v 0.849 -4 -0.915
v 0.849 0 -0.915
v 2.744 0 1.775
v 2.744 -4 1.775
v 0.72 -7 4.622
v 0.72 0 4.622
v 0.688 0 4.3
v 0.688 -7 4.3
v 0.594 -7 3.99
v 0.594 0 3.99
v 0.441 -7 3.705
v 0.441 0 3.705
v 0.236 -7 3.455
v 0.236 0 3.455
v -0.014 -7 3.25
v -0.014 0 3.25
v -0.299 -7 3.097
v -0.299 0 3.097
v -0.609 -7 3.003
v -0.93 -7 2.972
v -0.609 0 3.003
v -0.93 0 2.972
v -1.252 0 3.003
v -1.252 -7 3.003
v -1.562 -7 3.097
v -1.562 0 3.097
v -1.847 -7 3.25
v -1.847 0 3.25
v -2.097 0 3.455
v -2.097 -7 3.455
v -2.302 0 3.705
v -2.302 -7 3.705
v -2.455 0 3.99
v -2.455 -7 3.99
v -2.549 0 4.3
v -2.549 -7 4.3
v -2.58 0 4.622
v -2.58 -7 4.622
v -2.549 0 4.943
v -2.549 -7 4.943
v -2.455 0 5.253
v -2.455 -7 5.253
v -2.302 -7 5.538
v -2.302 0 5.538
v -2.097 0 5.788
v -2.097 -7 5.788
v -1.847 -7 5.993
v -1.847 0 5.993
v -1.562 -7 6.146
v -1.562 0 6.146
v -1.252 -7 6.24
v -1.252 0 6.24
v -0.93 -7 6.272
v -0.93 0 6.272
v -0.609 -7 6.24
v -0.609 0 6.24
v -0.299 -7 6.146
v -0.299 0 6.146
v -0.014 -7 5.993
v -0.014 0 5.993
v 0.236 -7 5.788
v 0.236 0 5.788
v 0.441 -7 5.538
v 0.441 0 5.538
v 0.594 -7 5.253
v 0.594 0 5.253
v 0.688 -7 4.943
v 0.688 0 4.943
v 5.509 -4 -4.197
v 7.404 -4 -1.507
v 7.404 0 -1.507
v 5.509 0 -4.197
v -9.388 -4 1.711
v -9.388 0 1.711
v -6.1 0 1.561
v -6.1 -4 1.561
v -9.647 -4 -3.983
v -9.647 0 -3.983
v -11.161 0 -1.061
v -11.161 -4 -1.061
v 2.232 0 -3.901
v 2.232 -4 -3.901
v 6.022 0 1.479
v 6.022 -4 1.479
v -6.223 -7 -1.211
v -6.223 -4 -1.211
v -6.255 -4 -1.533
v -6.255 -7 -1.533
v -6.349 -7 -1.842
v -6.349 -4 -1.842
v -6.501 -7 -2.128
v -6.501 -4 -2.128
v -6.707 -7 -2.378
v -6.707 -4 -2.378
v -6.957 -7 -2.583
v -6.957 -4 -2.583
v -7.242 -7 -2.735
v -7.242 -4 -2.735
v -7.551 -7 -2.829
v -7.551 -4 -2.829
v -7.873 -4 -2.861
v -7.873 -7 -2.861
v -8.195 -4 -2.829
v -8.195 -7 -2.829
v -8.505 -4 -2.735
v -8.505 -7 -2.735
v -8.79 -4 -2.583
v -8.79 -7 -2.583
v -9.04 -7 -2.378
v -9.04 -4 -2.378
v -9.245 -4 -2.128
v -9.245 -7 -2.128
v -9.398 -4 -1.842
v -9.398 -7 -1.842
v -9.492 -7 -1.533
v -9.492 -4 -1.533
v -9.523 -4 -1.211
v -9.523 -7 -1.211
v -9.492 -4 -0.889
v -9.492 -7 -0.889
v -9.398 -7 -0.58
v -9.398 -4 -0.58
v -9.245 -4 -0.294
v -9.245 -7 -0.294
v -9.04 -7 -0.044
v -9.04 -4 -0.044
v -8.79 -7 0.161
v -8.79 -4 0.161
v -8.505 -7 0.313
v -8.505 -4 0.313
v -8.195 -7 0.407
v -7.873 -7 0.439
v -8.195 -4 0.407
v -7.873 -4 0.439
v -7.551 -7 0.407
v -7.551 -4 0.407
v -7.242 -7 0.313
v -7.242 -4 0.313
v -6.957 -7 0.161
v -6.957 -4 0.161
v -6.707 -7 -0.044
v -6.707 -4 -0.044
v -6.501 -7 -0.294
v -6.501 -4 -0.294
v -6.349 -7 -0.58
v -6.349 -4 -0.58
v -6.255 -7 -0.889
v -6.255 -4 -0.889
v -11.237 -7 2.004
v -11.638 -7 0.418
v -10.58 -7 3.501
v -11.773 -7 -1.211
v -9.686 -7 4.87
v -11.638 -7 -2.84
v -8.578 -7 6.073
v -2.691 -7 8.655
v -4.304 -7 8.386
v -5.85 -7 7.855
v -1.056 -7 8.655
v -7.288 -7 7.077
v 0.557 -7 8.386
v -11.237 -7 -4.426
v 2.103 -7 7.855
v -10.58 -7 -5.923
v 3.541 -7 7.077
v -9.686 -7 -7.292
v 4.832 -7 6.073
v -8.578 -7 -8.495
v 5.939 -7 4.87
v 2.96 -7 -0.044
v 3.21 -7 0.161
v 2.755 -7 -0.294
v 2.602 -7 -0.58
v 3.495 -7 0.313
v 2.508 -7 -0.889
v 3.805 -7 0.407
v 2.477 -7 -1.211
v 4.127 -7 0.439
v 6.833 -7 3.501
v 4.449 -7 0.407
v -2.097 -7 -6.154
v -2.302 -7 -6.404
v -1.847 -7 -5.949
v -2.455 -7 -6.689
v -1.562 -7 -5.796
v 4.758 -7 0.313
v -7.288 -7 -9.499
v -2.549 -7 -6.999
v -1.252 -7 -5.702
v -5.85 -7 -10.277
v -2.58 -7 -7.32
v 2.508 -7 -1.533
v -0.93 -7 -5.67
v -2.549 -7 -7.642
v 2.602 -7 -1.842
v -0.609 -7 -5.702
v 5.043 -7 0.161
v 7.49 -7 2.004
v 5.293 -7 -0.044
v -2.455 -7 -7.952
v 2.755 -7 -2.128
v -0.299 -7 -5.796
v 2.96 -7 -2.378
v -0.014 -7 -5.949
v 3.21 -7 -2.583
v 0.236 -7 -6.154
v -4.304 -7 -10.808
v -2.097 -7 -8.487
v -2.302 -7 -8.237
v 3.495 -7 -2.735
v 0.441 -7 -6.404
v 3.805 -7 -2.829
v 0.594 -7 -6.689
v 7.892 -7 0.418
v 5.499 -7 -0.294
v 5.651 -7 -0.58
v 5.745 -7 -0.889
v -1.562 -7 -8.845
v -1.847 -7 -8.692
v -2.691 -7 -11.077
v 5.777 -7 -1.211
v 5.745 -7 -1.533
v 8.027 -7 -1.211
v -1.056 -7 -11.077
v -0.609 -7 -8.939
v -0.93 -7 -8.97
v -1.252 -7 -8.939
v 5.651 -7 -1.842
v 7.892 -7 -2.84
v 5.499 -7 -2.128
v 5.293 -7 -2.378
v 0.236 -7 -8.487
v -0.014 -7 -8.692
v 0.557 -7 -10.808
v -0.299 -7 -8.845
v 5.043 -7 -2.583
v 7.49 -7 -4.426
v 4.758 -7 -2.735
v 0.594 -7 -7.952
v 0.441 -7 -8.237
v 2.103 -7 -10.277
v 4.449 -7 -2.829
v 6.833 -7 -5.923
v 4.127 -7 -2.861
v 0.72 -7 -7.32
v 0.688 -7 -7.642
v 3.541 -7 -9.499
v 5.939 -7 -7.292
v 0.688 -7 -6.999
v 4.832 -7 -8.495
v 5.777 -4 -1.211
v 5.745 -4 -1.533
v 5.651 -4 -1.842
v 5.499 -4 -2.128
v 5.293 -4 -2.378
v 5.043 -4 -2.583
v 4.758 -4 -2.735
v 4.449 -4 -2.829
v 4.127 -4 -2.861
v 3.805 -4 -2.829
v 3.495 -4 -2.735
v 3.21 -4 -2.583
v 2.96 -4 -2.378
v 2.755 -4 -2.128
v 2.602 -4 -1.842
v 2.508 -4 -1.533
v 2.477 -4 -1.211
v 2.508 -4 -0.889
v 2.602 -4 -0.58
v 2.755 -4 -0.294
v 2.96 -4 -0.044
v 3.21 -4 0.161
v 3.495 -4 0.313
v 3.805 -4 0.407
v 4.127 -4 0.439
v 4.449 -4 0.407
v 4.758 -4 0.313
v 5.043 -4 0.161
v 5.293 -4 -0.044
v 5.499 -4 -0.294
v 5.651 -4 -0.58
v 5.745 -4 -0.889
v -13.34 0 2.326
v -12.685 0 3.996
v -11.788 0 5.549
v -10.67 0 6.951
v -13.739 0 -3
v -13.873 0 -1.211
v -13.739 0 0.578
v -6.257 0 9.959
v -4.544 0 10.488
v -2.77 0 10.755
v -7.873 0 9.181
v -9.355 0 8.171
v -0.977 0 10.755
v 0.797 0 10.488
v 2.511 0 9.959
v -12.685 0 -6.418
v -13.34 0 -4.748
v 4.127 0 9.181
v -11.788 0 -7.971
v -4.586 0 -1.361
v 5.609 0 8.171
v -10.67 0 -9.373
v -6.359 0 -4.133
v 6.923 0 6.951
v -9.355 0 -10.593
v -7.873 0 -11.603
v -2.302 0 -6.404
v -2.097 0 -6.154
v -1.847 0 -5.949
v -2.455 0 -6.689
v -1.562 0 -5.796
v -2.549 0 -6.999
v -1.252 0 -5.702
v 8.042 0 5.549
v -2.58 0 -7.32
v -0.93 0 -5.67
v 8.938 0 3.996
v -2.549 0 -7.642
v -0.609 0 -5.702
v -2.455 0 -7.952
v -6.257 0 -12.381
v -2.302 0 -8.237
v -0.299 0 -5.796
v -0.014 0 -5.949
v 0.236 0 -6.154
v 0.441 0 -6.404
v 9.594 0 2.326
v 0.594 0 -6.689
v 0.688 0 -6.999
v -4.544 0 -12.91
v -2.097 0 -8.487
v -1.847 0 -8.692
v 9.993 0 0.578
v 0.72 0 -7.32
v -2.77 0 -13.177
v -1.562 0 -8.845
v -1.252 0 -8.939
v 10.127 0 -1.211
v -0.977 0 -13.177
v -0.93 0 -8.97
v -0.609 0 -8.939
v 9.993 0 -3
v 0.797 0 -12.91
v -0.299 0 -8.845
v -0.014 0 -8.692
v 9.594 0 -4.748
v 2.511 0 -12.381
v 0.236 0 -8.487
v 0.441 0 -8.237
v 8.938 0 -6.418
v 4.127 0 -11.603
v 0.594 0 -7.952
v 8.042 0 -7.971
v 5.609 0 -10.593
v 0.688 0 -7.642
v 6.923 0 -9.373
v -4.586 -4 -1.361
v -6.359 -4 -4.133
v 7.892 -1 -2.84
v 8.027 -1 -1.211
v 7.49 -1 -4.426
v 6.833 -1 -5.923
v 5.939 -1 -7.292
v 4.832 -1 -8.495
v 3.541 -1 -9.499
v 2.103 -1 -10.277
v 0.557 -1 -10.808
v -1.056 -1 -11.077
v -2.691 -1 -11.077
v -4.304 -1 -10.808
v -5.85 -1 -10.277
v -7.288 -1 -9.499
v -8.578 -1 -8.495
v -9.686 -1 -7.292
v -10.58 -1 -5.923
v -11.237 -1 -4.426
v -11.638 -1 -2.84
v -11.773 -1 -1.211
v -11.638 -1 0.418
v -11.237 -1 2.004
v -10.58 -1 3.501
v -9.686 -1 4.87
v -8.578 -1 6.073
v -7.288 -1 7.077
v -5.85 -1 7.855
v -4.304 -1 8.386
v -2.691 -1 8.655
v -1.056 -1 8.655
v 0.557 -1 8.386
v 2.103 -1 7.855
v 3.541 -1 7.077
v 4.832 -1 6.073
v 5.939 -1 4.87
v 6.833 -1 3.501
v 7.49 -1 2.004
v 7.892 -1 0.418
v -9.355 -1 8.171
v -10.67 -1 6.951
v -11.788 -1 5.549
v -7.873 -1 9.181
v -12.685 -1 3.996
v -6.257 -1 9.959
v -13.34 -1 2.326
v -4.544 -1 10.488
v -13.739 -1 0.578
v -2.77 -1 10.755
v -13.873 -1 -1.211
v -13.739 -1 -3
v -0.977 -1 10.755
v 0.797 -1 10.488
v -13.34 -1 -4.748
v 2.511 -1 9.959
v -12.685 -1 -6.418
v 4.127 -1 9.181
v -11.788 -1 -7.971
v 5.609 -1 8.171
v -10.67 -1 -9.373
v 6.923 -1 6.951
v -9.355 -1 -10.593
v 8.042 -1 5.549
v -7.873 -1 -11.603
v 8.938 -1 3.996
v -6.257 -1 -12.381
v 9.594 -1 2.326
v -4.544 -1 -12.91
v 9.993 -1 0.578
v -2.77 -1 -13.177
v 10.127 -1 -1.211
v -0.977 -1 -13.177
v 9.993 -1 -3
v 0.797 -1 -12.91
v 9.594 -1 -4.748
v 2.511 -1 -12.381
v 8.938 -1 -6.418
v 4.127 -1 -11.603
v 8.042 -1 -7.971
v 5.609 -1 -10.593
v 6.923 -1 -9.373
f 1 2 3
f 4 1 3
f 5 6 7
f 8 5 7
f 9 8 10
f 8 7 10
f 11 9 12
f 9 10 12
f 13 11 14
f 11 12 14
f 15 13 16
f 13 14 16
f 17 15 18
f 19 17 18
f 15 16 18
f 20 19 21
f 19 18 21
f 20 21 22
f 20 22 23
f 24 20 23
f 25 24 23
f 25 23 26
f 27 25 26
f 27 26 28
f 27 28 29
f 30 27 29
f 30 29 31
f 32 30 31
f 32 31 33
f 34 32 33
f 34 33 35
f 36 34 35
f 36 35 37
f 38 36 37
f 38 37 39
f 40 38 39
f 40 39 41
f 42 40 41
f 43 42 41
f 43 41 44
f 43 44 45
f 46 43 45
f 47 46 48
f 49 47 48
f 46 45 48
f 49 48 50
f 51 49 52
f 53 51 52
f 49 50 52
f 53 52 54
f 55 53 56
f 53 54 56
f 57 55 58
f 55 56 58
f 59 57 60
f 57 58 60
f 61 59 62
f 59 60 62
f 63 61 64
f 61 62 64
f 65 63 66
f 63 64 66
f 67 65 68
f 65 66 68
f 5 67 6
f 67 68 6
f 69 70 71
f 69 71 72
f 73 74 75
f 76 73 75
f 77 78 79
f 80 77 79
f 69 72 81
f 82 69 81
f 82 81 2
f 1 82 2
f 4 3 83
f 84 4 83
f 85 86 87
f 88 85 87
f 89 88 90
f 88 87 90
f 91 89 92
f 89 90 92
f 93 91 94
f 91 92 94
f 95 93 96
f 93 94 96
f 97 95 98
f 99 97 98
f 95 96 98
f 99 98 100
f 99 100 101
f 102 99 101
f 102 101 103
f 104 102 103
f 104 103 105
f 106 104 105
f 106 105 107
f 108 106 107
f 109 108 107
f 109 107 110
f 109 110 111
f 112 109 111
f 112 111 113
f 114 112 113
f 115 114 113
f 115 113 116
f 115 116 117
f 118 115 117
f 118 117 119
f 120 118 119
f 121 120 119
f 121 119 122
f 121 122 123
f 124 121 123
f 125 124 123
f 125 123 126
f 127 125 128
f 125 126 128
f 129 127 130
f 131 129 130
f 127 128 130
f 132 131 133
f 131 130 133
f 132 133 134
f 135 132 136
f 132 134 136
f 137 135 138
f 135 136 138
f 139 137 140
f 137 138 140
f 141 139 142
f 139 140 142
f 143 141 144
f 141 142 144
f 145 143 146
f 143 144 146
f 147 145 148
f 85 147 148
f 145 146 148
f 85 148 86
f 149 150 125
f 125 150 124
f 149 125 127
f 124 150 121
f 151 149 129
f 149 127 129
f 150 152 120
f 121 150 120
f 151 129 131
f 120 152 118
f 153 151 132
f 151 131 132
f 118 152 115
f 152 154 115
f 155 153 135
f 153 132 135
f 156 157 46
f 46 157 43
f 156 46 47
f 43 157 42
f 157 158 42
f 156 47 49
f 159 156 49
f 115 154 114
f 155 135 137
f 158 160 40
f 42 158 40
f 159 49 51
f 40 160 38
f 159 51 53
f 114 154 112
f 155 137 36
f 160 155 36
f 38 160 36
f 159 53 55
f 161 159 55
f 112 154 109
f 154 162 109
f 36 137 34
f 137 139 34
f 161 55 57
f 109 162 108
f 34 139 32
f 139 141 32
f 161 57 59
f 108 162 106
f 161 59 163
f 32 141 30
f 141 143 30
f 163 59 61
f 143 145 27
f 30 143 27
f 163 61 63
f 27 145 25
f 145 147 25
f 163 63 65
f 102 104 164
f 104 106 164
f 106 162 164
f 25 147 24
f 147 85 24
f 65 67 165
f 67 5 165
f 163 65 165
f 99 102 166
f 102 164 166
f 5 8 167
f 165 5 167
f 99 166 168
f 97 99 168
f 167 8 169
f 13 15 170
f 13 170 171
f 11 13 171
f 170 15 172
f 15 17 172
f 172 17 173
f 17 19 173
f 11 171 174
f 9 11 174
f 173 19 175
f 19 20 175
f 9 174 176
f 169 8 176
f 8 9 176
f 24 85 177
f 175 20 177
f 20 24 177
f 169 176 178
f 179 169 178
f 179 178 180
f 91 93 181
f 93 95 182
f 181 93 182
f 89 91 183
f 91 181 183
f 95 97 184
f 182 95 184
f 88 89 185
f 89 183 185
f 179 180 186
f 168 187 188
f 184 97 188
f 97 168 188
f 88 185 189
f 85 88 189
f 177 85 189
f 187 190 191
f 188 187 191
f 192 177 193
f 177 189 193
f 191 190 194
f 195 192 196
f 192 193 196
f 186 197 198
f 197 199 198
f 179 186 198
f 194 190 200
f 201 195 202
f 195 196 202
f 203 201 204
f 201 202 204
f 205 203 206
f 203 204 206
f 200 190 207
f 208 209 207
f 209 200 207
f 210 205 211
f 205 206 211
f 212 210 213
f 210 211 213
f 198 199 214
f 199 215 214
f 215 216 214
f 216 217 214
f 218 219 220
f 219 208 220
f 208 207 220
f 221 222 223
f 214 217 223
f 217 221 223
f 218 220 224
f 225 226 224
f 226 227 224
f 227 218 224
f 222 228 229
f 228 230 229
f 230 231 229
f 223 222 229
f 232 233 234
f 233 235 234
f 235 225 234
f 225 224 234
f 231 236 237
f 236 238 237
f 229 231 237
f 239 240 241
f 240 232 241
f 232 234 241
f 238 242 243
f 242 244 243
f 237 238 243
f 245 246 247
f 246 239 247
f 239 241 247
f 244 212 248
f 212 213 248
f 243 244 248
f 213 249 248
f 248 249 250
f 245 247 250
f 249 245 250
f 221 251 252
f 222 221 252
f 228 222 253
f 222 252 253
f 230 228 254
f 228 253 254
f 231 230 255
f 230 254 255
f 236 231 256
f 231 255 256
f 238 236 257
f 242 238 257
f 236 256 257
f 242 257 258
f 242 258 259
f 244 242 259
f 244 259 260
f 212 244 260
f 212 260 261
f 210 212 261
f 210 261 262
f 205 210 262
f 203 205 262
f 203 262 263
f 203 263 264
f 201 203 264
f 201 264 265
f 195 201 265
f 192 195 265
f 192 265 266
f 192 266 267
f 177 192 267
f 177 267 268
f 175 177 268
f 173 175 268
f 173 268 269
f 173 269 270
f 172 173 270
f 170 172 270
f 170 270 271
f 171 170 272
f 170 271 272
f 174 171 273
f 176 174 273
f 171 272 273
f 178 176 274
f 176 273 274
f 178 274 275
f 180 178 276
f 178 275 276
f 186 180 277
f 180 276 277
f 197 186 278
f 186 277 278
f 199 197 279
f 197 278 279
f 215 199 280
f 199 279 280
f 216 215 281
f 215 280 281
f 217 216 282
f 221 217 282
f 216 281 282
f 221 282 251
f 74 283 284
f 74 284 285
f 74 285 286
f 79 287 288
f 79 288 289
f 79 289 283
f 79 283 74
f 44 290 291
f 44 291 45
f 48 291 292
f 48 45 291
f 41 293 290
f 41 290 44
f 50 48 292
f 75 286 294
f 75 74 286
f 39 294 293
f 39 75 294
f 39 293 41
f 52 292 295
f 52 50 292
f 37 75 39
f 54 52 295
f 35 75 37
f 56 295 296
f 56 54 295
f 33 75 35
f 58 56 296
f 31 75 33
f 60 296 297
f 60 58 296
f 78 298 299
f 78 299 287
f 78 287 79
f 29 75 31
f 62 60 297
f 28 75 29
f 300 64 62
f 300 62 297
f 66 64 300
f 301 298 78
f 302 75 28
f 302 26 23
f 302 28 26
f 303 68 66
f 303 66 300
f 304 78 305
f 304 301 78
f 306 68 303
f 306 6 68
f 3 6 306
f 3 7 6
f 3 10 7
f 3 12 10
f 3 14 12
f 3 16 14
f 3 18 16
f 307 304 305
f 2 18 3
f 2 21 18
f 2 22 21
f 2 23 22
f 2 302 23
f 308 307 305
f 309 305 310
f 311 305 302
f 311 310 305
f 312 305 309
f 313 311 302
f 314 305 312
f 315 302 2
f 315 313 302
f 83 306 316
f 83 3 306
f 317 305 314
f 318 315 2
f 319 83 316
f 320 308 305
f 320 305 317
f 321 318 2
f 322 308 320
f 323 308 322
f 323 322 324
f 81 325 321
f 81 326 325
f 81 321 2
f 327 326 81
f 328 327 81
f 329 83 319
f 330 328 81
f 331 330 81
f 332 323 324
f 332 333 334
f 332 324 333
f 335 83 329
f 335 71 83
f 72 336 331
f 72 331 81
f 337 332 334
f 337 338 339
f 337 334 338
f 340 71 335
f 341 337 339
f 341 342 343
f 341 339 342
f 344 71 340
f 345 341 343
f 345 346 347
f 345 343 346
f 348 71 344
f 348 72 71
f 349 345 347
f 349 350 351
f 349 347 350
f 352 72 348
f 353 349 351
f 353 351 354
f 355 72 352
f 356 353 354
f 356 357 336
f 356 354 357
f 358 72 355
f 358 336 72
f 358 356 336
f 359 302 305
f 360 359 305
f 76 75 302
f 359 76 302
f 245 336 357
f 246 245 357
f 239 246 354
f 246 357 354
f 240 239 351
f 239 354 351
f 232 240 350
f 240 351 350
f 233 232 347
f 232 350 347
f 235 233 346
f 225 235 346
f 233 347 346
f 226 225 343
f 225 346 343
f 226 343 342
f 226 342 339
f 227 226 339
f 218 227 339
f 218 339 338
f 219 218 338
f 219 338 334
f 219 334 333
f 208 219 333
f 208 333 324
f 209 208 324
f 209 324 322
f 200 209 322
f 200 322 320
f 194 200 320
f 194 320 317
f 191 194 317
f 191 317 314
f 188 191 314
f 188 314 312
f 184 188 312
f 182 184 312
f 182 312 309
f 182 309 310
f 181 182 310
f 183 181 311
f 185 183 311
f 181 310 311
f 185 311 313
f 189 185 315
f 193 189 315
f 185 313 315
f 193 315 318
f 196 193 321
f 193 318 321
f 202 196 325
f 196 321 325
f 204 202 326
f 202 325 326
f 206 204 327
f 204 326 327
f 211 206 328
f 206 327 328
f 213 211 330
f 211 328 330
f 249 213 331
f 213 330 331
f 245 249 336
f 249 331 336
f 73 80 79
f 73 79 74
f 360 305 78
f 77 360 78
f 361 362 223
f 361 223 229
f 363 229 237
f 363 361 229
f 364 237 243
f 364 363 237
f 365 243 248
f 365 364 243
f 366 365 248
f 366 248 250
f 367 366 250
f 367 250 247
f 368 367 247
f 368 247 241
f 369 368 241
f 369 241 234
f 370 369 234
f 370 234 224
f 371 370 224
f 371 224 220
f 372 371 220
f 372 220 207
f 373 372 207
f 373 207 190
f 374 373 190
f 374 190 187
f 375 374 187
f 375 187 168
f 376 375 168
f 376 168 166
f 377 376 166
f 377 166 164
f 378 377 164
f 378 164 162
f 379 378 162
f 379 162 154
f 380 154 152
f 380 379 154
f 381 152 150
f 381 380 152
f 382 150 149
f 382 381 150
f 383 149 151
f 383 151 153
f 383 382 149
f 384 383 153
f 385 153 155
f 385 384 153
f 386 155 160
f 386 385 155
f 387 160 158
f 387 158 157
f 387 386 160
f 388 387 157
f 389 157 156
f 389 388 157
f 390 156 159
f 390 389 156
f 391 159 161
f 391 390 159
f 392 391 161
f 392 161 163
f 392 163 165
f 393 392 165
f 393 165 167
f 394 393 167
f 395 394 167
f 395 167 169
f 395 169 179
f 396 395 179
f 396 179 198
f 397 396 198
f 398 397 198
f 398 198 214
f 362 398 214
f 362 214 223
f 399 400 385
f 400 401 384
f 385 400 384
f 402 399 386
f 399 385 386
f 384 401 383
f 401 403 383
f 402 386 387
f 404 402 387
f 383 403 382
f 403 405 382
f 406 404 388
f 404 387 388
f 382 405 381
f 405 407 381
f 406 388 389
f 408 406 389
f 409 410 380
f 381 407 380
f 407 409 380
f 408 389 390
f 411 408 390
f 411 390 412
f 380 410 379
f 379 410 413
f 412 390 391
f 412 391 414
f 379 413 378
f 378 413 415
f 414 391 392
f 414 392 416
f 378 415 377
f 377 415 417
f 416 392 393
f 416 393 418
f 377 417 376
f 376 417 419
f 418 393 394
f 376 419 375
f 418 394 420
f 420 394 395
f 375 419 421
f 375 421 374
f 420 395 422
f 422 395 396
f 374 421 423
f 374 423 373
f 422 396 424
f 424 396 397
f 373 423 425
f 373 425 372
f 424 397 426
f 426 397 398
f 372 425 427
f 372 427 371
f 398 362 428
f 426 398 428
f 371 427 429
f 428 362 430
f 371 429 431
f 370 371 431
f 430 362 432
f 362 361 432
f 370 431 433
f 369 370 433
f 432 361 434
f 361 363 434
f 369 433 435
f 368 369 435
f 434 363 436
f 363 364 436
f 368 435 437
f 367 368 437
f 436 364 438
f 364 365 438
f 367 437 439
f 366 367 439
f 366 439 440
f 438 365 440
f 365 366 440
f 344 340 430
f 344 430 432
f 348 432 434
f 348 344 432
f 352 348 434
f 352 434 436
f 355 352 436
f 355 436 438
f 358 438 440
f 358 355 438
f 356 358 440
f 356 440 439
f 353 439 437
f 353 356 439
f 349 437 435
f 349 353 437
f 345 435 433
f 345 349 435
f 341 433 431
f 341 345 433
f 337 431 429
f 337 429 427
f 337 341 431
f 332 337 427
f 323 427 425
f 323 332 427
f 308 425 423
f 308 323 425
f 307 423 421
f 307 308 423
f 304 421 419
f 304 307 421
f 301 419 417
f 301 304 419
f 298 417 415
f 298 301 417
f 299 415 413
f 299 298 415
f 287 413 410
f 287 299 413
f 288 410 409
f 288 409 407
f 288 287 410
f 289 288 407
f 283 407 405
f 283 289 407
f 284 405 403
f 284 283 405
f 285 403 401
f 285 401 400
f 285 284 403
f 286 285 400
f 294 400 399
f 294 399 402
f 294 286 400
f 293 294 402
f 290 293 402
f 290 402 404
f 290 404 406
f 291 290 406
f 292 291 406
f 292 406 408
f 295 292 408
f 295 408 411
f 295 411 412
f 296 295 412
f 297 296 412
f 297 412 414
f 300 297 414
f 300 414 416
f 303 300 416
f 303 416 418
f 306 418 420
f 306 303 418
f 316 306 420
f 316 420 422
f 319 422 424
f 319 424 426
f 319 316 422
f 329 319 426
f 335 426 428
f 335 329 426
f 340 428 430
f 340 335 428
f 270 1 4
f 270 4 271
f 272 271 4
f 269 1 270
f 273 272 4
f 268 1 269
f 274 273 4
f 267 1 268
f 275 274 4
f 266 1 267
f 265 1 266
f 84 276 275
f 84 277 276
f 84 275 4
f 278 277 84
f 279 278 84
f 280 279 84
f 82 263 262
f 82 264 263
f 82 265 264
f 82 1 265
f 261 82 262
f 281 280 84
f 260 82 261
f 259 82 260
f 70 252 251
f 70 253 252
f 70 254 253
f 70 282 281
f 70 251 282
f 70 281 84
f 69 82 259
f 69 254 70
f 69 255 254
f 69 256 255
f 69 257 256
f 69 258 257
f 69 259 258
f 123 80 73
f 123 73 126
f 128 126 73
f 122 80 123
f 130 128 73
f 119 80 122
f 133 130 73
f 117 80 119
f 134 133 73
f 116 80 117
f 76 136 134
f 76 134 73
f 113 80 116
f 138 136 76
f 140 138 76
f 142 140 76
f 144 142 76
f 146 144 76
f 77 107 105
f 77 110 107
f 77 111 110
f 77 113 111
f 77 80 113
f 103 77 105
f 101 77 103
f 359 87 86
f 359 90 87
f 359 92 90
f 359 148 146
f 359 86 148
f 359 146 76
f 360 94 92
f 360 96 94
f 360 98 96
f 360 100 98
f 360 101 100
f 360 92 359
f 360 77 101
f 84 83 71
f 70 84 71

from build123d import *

# Parameters (mm, degrees)
SKETCH1_R           = 9.9
BOSS_EXTRUDE1_DEPTH = 7
SKETCH1_3_R         = 12
BOSS_EXTRUDE2_DEPTH = 1
SKETCH1_4_R         = 1.65
CUT_EXTRUDE1_DEPTH  = 11
CUT_EXTRUDE2_DEPTH  = 4


with BuildPart() as part:
    # Sketch1 → Boss-Extrude1 (new body)
    with BuildSketch(Plane(origin=(0, 0, 0), x_dir=(1, 0, 0), z_dir=(0, 1, 0))):
        with Locations((-1.873325665, 1.210998997)):
            Circle(SKETCH1_R)
    extrude(amount=-BOSS_EXTRUDE1_DEPTH)

    # Sketch1<3> → Boss-Extrude2 (add)
    with BuildSketch(Plane(origin=(0, 0, 0), x_dir=(1, 0, 0), z_dir=(0, 1, 0))):
        with Locations((-1.873325665, 1.210998997)):
            Circle(SKETCH1_3_R)
    extrude(amount=-BOSS_EXTRUDE2_DEPTH)

    # Sketch1<4> → Cut-Extrude1 (cut)
    with BuildSketch(Plane(origin=(0, 0, 0), x_dir=(1, 0, 0), z_dir=(0, 1, 0))):
        with Locations((-0.93043169, 7.320486504)):
            Circle(SKETCH1_4_R)
        with Locations((-0.93043169, -4.621555184)):
            Circle(SKETCH1_4_R)
        with Locations((-7.873325665, 1.210998997)):
            Circle(SKETCH1_4_R)
        with Locations((4.126674335, 1.210998997)):
            Circle(SKETCH1_4_R)
    extrude(amount=-CUT_EXTRUDE1_DEPTH, mode=Mode.SUBTRACT)

    # Sketch1<5> → Cut-Extrude2 (cut)
    with BuildSketch(Plane(origin=(0, 0, 0), x_dir=(1, 0, 0), z_dir=(0, 1, 0))):
        Polygon((-6.100068619, -1.56128516), (-4.585828635, 1.360542568), (-6.359085682, 4.132826725), (-9.646582711, 3.983283154), (-11.160822695, 1.061455426), (-9.387565648, -1.710828731), align=None)
        Polygon((6.021818673, -1.47943367), (7.404229541, 1.507025804), (5.509085203, 4.197458471), (2.231529997, 3.901431664), (0.849119129, 0.91497219), (2.744263467, -1.775460477), align=None)
    extrude(amount=-CUT_EXTRUDE2_DEPTH, mode=Mode.SUBTRACT)


solid = part.part
